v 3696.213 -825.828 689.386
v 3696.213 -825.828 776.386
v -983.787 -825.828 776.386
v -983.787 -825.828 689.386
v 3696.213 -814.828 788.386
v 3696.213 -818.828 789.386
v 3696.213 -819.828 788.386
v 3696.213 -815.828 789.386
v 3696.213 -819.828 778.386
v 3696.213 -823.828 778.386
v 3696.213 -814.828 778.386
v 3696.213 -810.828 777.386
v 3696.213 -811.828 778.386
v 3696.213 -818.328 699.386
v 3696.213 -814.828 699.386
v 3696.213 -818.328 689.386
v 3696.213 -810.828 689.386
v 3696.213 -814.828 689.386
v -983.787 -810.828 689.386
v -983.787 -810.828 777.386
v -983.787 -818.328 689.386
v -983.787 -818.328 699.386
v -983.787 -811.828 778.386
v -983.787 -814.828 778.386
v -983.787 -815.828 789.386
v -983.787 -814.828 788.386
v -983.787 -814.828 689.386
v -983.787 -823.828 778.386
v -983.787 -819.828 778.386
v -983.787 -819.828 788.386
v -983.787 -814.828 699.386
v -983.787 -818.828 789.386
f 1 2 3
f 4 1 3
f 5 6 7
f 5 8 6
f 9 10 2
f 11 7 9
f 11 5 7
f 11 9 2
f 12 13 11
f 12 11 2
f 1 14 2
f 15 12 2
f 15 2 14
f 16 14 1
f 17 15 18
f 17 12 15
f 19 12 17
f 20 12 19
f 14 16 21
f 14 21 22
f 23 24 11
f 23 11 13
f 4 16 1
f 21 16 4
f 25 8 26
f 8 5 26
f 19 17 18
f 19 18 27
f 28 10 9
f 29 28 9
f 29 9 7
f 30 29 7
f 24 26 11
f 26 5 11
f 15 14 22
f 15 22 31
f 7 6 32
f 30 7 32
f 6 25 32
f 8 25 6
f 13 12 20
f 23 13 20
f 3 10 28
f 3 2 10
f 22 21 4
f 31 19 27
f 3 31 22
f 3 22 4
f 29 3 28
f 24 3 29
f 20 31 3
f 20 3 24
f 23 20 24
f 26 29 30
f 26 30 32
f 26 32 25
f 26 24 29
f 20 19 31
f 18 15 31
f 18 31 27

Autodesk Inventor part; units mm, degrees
ref_plane "YZ Plane" through (0, 0, 0) normal (1, 0, 0) x (0, 1, 0)
ref_plane "XZ Plane" through (0, 0, 0) normal (0, 1, 0) x (-1, 0, 0)
ref_plane "XY Plane" through (0, 0, 0) normal (0, 0, 1) x (1, 0, 0)
ref_plane "Arbeitsebene1" through (-659.8695, -810.8277, 426.2571) normal (0, 1, 0) x (-1, 0, 0)
sketch "Skizze1" plane through (-659.8695, -810.8277, 426.2571) normal (0, 1, 0) x (-1, 0, 0)
  line L0 (323.9176, 363.1286) -> (-4356.0824, 363.1286)
  line L1 (-4356.0824, 363.1286) -> (-4356.0824, 263.1286)
  line L2 (-4356.0824, 263.1286) -> (323.9176, 263.1286)
  line L3 (323.9176, 263.1286) -> (323.9176, 363.1286)
  dimension "d0" = 4680
  dimension "d1" = 100
extrude "Extrusion1" add sketch "Skizze1" against normal blind 15
sketch "Skizze2" plane through (3696.2129, -810.8277, 789.3857) normal (1, 0, 0) x (0, 0, -1)
  line L0 (0, 0) -> (100, 0) projected
  line L1 (0, 0) -> (0, -15) projected
  line L2 (100, -15) -> (0, -15) projected
  line L3 (100, 0) -> (100, -15) projected
  line L4 (0, -15) -> (100, -15) projected
  line L5 (0, -15) -> (11, -15)
  line L6 (11, -15) -> (11, -9)
  line L7 (11, -9) -> (0, -9)
  line L8 (0, -9) -> (0, -15)
  line L9 (100, 0) -> (0, 0) projected
  line L10 (11, 0) -> (0, 0)
  line L11 (0, 0) -> (0, -4)
  line L12 (0, -4) -> (11, -4)
  line L13 (11, -4) -> (11, 0)
  line L14 (100, 0) -> (100, -15) projected
  line L15 (100, -7.5) -> (90, -7.5)
  line L16 (90, -7.5) -> (90, -4)
  line L17 (90, -4) -> (100, -4)
  line L18 (100, -4) -> (100, -7.5)
  line L19 (0, -15) -> (100, -15)
  line L20 (100, -15) -> (100, 0)
  line L21 (100, 0) -> (0, 0)
  line L22 (0, 0) -> (0, -15)
  dimension "d4" = 5
  dimension "d5" = 11
  dimension "d6" = 4
  dimension "d7" = 10
extrude "Extrusion2" cut sketch "Skizze2" against normal up to surface (4680 mm away) contours L0 L13 L12 L1 | L7 L6 L2 L1 | L3 L15 L16 L17
chamfer "Fase1" distance 2 angle 45 1 edges at (1356.2129, -825.8277, 778.3857)
chamfer "Fase2" distance 1 angle 45 3 edges at (1356.2129, -814.8277, 789.3857) (1356.2129, -819.8277, 789.3857) (1356.2129, -810.8277, 778.3857)
properties part number "Brett_vorne"
